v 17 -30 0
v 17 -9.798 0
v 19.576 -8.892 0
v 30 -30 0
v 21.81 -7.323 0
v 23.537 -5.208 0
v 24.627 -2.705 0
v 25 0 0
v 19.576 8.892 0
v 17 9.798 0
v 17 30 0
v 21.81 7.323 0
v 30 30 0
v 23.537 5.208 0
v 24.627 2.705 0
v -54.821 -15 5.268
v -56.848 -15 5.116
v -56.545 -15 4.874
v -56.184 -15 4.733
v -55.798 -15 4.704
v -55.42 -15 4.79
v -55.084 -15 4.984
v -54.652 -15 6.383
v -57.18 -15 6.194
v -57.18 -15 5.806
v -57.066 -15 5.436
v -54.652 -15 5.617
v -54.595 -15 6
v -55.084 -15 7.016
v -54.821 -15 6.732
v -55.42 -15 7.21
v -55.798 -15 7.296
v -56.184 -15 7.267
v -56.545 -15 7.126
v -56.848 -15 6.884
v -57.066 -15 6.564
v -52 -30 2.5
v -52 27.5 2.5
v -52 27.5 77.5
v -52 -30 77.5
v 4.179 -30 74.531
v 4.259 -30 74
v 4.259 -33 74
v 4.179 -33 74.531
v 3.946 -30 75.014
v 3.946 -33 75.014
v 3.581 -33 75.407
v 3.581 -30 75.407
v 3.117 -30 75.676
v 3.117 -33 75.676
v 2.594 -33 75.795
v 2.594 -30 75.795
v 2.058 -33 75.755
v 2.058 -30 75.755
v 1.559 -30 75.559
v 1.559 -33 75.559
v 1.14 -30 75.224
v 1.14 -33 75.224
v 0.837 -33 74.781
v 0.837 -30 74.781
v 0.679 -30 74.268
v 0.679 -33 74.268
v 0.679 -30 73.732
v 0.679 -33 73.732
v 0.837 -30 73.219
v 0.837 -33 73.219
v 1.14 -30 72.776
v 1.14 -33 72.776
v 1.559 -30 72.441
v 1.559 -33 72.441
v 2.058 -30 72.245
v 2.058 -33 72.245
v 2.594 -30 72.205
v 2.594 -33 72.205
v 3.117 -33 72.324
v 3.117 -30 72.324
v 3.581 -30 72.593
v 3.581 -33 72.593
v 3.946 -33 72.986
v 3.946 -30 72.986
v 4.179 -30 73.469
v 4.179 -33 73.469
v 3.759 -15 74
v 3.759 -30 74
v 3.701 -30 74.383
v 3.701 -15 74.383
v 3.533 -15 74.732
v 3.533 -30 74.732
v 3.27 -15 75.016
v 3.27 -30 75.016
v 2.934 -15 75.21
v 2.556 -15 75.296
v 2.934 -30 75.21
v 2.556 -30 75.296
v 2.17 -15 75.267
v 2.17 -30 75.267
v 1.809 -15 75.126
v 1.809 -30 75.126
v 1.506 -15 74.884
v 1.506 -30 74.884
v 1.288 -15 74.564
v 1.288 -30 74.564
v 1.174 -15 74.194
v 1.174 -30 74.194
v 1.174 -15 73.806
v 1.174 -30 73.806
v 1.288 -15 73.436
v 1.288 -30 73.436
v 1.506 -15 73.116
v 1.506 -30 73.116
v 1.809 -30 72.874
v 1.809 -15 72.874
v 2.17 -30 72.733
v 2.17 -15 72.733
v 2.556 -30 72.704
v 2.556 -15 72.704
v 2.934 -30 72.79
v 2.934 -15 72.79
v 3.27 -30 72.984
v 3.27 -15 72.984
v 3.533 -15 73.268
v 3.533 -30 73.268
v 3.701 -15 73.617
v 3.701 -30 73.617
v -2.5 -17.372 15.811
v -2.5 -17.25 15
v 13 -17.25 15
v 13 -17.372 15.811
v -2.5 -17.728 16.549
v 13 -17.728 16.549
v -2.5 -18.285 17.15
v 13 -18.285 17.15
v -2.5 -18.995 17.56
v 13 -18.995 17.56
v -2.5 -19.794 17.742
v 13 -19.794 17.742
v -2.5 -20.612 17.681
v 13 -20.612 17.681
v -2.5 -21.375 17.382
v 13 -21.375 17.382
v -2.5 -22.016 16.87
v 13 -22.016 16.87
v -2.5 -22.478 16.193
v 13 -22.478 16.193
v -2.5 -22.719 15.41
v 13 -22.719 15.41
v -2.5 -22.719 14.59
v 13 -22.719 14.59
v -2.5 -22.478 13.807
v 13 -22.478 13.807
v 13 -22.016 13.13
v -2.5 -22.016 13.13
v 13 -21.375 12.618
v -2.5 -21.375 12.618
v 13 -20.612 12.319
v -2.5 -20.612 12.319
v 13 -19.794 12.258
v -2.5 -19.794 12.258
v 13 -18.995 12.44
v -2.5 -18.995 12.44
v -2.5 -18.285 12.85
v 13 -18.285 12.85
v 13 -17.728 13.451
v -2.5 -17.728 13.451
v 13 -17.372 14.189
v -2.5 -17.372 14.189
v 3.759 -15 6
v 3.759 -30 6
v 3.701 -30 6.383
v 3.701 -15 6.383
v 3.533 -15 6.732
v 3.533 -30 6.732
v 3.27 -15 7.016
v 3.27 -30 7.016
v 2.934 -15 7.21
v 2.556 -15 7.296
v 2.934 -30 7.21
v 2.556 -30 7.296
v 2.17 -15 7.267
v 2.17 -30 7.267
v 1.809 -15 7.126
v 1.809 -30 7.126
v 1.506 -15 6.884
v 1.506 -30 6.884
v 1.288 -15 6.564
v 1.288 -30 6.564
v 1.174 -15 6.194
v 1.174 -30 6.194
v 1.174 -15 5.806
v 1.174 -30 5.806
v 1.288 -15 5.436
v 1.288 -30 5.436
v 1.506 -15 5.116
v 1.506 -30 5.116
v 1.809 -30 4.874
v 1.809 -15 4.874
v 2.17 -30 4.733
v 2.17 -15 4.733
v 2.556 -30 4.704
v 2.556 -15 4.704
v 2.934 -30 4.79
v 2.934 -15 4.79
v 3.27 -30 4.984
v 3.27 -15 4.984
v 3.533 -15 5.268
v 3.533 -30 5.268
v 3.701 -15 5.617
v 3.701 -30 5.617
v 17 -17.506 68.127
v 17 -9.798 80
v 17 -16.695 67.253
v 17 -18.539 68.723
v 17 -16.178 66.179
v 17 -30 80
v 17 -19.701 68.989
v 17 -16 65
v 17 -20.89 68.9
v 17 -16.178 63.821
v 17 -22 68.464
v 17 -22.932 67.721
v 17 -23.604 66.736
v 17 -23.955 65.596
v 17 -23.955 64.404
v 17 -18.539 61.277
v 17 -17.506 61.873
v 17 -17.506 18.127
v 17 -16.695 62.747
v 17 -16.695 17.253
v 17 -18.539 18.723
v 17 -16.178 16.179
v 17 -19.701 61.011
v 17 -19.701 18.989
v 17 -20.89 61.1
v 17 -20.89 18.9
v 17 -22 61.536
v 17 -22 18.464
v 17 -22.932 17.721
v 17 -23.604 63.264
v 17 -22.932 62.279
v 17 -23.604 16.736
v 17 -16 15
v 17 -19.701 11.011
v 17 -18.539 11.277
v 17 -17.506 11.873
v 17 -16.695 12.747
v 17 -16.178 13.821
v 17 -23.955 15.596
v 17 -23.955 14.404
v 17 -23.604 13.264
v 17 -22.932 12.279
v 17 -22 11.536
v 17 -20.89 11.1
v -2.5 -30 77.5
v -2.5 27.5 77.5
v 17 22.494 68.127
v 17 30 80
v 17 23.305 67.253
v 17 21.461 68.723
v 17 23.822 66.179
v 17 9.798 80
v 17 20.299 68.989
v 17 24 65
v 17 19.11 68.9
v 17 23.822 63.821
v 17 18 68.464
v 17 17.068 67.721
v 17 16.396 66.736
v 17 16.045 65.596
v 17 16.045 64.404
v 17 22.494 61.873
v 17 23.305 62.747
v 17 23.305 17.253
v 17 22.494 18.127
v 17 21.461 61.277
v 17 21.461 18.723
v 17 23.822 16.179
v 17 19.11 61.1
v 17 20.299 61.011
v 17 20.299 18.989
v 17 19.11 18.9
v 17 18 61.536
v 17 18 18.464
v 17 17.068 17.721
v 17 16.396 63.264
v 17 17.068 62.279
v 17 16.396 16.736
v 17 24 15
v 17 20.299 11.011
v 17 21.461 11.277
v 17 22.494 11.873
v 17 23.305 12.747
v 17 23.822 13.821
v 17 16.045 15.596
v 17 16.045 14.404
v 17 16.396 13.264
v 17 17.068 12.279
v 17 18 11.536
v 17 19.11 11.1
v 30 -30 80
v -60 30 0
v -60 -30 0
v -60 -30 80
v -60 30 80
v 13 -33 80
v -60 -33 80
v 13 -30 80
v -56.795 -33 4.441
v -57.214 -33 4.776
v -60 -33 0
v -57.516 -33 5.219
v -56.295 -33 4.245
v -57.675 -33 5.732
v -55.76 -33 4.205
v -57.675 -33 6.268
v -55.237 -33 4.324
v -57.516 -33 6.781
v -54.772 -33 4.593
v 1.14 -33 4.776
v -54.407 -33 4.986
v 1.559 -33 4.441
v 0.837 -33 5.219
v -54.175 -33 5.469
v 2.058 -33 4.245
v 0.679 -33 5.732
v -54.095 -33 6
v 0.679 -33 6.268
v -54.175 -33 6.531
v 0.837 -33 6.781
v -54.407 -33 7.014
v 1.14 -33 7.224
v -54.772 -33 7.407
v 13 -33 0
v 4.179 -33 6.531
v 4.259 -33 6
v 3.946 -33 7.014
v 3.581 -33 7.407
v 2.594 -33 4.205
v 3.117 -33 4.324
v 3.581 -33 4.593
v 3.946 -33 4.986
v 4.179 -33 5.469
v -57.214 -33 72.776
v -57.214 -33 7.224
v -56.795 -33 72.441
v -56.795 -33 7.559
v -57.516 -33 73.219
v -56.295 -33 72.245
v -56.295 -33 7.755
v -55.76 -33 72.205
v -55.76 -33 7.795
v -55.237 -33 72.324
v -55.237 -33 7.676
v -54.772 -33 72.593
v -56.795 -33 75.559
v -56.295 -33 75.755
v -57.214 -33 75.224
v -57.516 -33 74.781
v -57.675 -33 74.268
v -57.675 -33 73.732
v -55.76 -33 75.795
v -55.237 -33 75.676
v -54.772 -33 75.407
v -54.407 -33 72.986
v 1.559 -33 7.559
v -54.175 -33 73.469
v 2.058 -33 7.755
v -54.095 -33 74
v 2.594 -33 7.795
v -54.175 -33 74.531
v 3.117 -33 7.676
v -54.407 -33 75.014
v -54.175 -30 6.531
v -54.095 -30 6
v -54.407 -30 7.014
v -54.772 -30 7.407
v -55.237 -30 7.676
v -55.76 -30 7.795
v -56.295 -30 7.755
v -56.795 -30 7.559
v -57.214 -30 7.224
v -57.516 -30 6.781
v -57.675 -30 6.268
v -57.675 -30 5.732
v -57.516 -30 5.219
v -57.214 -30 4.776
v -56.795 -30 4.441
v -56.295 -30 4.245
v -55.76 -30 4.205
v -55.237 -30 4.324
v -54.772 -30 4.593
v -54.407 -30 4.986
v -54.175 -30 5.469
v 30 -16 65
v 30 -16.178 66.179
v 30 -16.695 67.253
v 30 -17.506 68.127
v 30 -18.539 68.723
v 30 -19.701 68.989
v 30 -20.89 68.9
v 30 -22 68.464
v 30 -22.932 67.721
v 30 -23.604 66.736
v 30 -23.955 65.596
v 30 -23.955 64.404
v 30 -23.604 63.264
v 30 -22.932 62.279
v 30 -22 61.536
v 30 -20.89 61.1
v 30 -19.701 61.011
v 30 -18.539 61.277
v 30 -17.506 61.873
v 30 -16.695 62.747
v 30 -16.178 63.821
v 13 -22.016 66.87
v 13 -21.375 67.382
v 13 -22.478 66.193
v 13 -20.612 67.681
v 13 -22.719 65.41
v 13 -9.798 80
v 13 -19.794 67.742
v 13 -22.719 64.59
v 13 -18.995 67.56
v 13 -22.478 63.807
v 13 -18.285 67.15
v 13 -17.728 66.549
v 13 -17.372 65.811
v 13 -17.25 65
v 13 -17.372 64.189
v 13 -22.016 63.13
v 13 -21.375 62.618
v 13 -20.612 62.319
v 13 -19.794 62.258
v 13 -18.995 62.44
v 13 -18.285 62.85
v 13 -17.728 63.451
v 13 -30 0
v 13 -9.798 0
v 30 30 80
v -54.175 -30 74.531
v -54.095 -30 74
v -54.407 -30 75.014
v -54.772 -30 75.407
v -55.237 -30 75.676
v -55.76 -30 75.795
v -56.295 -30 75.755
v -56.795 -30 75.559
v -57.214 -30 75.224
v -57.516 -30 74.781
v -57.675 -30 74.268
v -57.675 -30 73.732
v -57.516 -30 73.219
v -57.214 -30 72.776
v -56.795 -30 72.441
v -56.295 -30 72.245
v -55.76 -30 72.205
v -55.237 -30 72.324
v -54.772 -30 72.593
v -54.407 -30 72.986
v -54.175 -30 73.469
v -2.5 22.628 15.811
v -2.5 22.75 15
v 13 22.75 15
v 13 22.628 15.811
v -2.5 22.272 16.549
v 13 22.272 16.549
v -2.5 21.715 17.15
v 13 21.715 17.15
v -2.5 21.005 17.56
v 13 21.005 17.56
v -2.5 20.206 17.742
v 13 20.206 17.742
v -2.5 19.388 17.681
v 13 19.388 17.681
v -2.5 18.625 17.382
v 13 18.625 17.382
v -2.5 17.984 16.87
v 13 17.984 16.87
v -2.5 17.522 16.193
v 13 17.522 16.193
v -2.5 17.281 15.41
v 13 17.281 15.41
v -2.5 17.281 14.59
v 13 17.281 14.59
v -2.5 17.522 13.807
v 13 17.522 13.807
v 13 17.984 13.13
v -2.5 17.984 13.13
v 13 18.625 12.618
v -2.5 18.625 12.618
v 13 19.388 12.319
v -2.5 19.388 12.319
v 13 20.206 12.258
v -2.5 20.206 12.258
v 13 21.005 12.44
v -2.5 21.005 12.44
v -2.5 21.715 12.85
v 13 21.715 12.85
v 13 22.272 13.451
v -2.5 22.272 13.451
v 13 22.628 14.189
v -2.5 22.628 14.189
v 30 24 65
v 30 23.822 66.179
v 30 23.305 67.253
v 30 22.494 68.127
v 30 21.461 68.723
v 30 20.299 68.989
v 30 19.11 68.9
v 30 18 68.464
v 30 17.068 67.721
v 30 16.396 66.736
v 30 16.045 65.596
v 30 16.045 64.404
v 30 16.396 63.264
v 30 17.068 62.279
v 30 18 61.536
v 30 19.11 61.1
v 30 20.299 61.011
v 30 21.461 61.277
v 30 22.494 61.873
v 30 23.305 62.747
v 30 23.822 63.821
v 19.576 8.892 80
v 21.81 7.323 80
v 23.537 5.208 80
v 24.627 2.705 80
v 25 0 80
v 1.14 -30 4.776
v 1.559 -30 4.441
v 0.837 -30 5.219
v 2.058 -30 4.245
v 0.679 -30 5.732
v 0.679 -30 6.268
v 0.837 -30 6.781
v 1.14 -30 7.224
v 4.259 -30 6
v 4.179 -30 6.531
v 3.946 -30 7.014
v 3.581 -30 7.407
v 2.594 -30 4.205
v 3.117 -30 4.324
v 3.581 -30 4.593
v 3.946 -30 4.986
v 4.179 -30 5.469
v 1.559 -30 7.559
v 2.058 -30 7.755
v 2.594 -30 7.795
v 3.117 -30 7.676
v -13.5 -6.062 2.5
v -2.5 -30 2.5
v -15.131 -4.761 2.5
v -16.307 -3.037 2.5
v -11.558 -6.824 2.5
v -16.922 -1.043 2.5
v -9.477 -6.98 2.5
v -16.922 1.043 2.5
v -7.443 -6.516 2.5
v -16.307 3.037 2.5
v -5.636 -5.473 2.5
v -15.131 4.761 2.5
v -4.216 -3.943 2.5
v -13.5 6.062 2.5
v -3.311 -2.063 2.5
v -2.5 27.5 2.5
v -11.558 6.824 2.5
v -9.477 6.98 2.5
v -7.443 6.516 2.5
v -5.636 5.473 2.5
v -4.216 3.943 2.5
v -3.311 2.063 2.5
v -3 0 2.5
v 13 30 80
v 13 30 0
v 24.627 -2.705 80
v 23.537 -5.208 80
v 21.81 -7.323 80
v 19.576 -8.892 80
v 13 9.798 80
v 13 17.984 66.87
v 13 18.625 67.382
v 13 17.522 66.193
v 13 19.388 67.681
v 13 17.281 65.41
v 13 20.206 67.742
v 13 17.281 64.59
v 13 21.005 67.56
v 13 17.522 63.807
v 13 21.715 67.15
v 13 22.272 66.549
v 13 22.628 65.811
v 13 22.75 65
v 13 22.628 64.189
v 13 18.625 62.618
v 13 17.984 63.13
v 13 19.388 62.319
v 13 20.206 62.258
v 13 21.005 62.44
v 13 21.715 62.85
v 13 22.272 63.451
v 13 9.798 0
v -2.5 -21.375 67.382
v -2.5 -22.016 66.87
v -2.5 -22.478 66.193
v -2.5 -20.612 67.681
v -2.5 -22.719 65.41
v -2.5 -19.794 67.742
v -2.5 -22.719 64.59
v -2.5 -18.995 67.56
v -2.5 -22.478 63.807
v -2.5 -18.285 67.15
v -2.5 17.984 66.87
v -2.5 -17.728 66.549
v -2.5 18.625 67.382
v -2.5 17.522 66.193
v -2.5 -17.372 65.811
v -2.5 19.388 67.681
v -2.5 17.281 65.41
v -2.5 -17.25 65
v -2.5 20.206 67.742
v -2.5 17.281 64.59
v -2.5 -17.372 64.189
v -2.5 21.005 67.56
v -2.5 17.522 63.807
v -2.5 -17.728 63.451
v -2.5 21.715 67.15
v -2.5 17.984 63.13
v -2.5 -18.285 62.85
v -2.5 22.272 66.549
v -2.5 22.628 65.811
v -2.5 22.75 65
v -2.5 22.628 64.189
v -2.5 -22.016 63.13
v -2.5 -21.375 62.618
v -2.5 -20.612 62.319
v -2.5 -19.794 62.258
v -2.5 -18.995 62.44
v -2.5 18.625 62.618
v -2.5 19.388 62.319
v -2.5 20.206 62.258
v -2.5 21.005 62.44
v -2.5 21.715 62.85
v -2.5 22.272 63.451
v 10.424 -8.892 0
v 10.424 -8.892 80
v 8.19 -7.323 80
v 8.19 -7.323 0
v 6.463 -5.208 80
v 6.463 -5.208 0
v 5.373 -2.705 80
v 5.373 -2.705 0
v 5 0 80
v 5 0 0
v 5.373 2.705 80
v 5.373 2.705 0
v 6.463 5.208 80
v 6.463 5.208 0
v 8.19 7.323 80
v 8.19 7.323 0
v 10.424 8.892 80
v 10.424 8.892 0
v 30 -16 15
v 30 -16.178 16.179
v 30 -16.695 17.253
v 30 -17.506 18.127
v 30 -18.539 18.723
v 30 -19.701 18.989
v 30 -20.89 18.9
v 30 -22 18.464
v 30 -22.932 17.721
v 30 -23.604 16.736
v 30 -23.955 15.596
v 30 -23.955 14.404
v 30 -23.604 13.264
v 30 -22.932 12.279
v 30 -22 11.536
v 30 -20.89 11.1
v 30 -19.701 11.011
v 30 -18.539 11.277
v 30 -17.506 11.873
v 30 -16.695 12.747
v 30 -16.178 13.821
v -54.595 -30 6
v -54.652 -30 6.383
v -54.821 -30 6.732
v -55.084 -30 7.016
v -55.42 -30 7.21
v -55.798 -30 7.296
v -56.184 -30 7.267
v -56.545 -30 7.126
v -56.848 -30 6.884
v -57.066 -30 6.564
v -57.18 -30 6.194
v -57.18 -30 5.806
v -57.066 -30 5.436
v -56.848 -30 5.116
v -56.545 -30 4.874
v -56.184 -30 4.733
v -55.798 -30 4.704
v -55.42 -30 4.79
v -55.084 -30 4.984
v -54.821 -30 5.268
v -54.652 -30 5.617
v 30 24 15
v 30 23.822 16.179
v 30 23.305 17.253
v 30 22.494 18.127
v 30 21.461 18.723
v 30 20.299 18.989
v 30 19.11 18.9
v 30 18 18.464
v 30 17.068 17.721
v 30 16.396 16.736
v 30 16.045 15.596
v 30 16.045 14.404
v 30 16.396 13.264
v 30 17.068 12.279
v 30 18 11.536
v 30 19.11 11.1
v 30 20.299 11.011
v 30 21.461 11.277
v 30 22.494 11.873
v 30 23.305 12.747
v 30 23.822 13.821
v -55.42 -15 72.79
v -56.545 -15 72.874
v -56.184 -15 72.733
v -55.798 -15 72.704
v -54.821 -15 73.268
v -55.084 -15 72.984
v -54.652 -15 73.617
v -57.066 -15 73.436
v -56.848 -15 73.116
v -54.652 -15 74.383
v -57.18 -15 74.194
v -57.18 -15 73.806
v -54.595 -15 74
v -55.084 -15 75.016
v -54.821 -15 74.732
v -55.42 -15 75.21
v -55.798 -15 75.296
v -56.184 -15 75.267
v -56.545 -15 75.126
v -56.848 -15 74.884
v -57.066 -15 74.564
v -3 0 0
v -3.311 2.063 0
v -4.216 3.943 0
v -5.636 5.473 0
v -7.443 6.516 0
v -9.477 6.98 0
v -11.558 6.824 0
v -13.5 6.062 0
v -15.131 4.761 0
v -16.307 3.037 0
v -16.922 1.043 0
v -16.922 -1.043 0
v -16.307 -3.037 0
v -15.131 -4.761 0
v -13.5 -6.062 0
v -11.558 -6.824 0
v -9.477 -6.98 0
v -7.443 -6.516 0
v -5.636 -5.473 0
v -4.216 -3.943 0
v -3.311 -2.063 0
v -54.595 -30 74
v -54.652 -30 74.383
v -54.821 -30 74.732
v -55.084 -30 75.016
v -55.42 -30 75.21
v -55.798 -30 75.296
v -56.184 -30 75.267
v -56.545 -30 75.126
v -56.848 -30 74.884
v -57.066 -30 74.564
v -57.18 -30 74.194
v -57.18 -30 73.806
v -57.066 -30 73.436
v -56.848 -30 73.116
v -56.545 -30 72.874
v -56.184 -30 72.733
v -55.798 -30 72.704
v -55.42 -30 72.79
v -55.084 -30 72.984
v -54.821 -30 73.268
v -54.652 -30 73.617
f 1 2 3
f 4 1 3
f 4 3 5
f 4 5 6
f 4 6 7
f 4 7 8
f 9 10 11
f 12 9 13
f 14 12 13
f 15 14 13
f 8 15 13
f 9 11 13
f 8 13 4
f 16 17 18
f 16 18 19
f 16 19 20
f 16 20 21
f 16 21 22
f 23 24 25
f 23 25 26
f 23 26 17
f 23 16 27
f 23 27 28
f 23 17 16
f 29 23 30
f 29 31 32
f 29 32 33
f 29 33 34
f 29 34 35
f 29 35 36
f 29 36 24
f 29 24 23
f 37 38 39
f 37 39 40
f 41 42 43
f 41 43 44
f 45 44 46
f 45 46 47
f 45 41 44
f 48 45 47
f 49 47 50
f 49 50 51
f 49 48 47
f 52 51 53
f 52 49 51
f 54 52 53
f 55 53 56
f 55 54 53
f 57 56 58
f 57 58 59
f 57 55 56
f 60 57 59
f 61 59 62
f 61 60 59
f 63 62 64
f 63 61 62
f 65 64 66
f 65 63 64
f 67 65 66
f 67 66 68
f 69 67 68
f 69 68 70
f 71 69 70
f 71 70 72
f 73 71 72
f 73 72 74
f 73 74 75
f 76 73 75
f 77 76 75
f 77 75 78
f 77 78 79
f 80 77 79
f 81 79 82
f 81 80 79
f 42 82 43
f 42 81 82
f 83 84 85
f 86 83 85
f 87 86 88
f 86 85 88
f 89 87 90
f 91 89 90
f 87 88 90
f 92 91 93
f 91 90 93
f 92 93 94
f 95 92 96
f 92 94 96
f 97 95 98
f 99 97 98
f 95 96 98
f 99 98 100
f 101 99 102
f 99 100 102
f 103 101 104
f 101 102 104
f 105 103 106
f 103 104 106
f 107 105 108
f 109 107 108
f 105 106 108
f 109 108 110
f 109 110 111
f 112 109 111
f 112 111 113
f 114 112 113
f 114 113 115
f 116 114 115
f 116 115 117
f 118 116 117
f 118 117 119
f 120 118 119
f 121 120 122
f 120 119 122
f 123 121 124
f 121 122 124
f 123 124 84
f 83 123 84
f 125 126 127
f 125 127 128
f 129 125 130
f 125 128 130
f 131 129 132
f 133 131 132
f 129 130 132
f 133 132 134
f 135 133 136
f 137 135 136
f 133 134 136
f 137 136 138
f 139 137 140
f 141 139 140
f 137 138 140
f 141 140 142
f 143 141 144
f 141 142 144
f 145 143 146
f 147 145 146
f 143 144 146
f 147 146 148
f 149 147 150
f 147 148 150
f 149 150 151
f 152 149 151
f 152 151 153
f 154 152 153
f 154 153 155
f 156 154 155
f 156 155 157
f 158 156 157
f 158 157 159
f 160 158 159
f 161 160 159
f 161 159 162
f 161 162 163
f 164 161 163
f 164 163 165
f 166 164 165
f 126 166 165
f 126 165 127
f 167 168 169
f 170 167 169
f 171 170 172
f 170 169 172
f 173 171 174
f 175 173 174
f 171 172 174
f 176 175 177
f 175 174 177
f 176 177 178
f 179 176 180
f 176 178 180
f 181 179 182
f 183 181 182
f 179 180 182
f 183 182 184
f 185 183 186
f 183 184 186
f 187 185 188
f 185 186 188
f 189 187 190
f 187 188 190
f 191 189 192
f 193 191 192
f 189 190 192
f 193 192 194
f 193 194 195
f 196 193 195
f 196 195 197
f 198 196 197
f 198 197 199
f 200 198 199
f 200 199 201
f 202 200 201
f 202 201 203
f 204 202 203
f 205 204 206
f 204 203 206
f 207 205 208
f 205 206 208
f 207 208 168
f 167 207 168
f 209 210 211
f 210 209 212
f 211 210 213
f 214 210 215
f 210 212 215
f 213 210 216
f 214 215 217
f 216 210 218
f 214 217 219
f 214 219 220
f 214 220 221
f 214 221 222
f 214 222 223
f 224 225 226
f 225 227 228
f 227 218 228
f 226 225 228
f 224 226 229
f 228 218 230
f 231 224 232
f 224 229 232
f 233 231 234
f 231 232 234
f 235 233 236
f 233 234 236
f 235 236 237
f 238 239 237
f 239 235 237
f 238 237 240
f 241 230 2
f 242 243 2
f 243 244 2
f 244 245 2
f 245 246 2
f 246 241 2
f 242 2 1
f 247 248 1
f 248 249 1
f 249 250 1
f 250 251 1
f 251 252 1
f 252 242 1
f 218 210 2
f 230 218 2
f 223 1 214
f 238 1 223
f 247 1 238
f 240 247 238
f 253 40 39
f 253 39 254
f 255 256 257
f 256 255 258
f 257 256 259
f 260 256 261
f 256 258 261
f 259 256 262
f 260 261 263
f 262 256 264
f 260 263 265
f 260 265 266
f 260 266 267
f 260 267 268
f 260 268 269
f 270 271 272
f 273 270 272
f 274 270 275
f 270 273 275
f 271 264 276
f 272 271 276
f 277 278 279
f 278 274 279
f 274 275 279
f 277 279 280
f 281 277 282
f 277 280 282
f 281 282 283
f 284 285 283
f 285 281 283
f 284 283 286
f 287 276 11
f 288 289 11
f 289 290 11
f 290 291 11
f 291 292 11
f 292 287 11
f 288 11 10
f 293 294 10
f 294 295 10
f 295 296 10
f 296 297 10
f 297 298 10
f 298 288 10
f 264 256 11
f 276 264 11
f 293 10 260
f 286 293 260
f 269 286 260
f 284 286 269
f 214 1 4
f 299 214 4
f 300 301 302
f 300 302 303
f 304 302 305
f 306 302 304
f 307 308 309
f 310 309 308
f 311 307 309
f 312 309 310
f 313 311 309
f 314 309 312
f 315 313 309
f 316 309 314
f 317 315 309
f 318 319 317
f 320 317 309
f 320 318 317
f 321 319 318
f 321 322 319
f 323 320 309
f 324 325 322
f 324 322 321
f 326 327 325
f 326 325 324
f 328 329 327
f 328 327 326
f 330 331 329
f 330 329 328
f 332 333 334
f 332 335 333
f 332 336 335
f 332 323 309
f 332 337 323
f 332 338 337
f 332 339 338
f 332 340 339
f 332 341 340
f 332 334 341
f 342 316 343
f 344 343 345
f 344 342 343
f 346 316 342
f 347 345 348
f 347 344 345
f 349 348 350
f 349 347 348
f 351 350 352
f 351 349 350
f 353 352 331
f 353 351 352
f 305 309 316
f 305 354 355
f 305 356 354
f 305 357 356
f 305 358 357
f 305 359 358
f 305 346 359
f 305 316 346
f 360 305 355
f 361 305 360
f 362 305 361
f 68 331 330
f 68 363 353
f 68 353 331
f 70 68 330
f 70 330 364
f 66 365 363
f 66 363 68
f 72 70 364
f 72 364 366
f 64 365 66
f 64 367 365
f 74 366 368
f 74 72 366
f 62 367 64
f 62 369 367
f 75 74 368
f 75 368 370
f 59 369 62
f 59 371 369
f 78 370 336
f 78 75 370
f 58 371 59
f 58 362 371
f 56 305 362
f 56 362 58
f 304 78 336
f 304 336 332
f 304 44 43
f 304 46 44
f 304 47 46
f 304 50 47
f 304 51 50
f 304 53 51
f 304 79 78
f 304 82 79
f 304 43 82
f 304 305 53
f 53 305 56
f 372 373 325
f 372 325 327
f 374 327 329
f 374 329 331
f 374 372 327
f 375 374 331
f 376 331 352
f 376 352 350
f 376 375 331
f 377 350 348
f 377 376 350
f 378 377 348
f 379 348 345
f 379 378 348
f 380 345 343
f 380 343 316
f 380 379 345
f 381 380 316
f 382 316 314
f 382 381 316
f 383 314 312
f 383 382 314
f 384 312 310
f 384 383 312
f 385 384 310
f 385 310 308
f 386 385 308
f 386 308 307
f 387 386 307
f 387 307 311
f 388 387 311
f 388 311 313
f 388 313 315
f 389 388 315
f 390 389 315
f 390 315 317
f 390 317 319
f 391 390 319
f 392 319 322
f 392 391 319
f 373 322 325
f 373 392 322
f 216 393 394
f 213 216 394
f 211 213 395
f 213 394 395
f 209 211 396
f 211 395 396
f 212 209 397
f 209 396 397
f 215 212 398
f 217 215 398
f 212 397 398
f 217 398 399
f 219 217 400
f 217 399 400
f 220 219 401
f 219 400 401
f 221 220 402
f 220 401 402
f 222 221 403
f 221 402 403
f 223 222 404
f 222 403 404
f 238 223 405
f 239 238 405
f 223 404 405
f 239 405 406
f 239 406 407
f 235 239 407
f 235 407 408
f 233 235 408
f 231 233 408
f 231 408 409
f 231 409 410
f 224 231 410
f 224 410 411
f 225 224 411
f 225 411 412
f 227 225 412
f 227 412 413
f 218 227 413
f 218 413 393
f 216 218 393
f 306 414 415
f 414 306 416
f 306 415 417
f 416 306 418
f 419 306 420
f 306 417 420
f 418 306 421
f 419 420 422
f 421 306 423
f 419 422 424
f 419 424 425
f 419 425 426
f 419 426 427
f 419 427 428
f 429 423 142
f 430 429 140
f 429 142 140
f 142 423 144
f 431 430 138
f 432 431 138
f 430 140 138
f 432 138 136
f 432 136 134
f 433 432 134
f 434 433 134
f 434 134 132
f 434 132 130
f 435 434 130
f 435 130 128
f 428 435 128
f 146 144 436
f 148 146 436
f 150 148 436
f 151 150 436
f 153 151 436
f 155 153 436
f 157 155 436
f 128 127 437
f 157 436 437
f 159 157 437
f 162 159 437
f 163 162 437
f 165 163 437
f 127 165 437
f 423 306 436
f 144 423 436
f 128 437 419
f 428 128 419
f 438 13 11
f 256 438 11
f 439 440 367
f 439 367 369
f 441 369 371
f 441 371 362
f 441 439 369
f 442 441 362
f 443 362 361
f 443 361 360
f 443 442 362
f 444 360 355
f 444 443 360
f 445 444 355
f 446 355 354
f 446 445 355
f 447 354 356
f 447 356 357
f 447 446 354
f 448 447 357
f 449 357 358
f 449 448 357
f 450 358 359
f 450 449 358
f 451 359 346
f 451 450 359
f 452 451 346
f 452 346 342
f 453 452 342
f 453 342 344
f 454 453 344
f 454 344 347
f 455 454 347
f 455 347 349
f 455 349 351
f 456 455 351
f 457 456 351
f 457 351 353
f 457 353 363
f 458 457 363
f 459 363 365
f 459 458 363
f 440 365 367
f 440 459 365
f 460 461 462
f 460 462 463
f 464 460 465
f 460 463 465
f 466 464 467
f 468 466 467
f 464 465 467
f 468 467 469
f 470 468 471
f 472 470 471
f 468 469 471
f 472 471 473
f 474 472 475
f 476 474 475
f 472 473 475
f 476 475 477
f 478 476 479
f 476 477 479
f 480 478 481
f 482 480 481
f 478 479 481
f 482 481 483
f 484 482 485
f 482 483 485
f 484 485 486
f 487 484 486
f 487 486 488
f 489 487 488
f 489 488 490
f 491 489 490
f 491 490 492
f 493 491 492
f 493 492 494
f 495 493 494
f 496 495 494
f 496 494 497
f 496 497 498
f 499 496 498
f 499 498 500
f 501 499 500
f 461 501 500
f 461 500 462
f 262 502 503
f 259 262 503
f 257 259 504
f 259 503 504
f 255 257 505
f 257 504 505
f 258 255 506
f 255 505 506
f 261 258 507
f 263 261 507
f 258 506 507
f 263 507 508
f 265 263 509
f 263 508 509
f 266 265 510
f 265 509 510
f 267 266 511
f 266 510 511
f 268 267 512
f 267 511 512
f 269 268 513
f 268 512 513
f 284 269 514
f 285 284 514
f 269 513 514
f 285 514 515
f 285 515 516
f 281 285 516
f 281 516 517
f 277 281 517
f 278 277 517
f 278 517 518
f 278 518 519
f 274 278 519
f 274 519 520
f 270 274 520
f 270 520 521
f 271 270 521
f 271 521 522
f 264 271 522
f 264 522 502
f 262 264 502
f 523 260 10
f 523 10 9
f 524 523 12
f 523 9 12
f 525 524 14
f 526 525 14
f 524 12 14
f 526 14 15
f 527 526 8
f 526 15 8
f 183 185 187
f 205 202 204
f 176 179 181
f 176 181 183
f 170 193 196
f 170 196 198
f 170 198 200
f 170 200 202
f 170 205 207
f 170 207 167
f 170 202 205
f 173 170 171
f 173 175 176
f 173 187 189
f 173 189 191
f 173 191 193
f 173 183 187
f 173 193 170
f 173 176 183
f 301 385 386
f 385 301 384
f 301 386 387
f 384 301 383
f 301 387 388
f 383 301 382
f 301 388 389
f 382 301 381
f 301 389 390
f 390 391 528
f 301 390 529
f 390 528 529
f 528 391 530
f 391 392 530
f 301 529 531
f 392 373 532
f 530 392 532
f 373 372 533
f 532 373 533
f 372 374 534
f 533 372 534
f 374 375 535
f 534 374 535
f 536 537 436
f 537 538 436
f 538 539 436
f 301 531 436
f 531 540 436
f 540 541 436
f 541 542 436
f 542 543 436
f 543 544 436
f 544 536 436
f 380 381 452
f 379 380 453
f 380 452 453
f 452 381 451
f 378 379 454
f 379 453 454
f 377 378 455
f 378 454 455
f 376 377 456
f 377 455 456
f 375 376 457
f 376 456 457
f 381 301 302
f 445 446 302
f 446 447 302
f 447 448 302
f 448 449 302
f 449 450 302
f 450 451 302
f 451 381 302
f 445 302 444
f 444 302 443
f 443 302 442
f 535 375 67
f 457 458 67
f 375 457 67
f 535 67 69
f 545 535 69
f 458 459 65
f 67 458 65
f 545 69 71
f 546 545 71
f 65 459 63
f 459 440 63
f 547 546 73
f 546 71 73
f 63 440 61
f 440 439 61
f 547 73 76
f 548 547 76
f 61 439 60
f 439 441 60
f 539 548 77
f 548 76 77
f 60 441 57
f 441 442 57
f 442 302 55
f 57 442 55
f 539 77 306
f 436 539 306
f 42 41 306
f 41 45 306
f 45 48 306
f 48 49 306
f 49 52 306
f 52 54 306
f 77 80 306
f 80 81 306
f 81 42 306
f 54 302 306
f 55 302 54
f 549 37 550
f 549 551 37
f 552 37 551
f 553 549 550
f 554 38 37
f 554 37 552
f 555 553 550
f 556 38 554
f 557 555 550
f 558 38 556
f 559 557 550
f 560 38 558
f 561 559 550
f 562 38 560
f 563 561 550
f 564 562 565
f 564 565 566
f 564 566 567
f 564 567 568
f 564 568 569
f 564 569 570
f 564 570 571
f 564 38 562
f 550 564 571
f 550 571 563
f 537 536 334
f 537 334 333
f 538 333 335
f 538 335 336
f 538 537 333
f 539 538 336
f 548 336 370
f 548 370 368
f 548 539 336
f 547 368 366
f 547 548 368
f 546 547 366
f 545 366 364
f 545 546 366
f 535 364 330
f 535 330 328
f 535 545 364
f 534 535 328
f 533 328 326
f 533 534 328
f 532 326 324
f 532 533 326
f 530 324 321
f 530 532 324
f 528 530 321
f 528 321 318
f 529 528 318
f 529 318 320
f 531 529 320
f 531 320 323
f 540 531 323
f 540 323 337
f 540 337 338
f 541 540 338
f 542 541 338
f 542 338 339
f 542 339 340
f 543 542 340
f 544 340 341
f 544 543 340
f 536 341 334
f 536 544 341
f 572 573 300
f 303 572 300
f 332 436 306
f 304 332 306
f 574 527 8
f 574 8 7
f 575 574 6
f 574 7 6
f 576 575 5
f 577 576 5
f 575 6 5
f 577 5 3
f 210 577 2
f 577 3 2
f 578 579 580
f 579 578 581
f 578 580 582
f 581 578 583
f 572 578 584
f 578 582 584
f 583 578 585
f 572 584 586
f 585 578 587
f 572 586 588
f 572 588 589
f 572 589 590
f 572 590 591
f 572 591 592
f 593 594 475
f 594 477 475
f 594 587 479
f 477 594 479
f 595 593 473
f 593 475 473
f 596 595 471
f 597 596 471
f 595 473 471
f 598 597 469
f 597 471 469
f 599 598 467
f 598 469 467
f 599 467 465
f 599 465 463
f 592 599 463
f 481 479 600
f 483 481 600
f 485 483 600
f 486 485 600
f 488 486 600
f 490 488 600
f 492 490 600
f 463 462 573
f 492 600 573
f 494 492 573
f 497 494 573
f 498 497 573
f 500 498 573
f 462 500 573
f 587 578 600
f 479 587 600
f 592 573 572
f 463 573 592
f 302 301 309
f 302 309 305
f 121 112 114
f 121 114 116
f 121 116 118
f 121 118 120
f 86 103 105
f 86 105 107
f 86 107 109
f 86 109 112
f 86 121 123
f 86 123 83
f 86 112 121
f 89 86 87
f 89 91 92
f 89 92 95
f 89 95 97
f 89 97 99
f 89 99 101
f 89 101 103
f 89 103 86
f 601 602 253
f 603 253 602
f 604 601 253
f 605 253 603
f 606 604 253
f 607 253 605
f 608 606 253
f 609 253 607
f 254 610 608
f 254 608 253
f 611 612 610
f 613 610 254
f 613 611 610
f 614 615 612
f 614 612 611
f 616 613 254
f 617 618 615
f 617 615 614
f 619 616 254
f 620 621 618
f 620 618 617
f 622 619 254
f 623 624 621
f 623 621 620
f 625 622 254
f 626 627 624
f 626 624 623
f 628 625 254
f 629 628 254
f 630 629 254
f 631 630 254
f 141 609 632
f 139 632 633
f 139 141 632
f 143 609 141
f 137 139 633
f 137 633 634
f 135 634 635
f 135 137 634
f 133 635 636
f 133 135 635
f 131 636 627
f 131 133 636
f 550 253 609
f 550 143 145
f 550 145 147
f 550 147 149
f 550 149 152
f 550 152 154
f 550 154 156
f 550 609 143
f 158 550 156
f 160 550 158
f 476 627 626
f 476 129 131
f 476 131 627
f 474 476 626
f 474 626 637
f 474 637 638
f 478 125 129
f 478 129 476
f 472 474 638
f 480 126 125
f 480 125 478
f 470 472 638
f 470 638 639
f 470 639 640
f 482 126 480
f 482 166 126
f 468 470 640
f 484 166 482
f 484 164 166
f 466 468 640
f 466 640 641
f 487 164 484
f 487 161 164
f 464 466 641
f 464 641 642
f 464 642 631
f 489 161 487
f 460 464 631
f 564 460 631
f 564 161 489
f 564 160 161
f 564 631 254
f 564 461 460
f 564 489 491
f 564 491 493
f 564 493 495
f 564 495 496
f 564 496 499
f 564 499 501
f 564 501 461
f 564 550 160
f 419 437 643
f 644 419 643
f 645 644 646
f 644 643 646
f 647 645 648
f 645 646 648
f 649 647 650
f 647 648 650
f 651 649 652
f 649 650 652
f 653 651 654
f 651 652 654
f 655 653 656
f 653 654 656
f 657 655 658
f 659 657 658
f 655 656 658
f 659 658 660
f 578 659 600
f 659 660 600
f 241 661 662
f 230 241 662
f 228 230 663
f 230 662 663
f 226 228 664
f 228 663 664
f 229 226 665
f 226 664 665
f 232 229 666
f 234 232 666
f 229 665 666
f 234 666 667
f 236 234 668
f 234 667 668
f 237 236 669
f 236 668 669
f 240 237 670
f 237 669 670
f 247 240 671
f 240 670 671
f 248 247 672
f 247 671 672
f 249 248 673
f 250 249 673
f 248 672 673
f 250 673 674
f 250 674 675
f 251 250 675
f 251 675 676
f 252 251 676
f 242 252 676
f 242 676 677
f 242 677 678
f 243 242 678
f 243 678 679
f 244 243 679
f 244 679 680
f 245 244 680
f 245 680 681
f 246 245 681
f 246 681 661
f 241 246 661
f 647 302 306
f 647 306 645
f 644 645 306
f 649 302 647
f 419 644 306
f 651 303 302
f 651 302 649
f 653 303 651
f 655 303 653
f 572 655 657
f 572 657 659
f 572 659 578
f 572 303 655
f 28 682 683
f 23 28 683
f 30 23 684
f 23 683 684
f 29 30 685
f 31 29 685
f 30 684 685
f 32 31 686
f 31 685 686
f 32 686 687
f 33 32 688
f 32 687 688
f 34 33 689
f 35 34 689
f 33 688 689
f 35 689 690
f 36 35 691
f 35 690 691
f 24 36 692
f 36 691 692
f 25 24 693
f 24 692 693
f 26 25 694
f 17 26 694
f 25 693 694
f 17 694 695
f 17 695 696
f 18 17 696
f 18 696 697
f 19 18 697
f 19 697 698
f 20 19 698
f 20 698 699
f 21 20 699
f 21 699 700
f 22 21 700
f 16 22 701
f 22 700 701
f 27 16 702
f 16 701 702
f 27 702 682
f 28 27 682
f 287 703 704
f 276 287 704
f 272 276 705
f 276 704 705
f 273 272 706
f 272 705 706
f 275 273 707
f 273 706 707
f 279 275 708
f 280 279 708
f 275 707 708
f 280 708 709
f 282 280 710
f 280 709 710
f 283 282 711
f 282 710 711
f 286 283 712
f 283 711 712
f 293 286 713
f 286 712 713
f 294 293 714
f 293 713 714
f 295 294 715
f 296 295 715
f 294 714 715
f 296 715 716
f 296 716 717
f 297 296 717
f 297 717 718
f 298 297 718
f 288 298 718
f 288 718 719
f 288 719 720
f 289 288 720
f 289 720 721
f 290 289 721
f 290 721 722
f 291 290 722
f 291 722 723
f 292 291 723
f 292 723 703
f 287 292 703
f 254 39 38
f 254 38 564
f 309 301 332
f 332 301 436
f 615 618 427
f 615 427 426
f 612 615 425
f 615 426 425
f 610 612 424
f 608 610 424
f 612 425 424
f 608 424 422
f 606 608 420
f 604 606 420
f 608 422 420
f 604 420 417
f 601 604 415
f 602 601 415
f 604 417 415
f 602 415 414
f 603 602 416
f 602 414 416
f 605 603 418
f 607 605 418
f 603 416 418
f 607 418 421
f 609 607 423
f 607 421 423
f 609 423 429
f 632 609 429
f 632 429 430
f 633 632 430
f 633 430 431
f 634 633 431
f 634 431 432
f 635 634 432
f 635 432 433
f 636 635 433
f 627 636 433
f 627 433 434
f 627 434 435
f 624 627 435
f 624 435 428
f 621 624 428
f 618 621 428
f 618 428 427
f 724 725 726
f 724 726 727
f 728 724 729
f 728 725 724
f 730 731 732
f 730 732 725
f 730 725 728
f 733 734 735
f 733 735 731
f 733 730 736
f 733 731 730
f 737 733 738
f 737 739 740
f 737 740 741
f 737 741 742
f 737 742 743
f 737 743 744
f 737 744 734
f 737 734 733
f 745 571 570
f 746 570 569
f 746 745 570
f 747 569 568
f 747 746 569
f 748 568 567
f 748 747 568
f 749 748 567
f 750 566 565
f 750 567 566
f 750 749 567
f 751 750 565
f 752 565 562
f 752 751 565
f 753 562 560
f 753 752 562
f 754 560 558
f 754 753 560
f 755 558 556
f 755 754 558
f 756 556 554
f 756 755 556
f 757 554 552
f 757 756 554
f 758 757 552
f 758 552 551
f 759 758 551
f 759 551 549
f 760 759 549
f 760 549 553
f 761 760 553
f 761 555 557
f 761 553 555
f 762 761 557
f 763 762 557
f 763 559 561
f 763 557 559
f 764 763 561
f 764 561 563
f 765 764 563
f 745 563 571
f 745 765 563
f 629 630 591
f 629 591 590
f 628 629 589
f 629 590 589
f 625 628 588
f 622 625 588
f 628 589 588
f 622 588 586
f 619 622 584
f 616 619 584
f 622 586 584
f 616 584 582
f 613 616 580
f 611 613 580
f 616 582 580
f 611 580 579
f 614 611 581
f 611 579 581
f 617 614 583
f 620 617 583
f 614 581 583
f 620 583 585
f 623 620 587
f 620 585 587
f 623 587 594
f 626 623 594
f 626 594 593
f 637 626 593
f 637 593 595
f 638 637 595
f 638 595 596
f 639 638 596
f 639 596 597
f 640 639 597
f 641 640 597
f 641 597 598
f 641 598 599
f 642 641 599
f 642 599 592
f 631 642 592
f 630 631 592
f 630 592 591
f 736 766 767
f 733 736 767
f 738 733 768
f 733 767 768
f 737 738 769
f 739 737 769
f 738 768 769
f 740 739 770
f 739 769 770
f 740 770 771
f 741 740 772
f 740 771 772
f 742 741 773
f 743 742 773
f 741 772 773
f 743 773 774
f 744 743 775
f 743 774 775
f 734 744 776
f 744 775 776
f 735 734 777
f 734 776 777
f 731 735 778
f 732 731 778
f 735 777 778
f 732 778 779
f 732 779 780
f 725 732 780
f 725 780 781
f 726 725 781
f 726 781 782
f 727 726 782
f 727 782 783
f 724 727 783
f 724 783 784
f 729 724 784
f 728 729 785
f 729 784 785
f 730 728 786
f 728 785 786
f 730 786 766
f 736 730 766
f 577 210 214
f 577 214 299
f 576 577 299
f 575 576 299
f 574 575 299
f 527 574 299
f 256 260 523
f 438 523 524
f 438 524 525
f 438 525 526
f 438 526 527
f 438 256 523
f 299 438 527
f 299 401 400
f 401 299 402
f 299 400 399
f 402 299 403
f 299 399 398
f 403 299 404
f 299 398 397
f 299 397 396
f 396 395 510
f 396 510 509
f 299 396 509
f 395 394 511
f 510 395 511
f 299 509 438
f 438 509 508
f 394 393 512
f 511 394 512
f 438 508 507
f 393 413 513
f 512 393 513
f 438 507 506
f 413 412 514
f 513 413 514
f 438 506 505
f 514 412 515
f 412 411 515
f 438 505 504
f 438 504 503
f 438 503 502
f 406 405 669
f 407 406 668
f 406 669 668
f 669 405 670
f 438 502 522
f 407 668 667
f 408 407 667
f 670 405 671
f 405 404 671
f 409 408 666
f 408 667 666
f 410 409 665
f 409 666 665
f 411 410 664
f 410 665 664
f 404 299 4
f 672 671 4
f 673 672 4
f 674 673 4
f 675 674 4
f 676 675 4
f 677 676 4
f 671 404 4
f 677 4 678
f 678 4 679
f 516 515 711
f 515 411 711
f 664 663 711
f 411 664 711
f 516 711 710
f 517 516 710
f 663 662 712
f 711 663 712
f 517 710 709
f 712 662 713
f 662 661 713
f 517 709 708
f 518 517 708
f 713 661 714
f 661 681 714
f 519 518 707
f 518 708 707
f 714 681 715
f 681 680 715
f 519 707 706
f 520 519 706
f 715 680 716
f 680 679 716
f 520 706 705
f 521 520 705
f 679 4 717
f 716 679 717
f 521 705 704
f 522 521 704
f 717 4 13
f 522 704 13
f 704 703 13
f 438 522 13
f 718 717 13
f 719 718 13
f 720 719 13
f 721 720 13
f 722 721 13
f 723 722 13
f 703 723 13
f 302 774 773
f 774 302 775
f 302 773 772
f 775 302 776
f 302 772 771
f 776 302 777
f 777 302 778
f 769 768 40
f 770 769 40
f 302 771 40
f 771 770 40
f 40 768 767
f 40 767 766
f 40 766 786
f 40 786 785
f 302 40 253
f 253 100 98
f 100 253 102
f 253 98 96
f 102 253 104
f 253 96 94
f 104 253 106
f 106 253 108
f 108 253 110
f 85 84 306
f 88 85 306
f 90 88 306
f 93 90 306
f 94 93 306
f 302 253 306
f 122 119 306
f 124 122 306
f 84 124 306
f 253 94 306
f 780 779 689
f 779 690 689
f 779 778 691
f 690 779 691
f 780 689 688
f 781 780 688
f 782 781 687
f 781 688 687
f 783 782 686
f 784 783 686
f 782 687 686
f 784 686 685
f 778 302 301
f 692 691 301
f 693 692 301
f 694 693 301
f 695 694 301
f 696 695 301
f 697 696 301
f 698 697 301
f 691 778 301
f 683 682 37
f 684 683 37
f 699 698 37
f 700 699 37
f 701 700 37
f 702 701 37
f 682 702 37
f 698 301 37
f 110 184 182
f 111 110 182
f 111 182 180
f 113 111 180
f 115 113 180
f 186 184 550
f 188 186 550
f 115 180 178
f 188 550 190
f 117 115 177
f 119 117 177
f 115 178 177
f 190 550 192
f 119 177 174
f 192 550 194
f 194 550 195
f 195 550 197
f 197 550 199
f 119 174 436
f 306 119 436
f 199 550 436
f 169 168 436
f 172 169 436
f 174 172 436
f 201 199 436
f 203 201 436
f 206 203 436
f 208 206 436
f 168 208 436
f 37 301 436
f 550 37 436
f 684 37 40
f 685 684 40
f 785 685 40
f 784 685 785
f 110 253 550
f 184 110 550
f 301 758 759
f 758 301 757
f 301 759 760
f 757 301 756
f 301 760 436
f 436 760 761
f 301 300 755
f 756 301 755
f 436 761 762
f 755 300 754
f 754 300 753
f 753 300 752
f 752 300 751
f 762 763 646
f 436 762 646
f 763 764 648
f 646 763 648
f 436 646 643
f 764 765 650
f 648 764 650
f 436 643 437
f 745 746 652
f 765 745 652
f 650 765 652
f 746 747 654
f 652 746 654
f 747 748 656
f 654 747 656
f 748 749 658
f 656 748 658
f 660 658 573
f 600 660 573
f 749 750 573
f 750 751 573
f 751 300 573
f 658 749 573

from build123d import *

# Parameters (mm, degrees)
F1_DEPTH  = 80
F0_W      = 60
F0_H      = 60
F2_DEPTH  = 80
F3_T      = -2.5
F4_W      = 60
F4_H      = 80
F5_DEPTH  = 8
F7_R      = 2.75
F8_DEPTH  = 35
F7_R_2    = 4
F9_DEPTH  = 15
F10_R     = 7
F11_DEPTH = 25
F12_W     = 73
F12_H     = 80
F12_R     = 1.8
F12_W_2   = 49.5
F12_H_2   = 75
F13_DEPTH = 3
F12_R_2   = 1.3
F14_DEPTH = 15


with BuildPart() as f1:
    # F0 (on Top) → F1 (new body)
    with BuildSketch(Plane.XY):
        with BuildLine():
            ThreePointArc((17, 9.7979589711), (22.7459666924, 6.3245553203), (25, 0))
            ThreePointArc((25, 0), (22.7459666924, -6.3245553203), (17, -9.7979589711))
            Line((17, -9.7979589711), (17, -30))
            Line((17, -30), (30, -30))
            Line((30, -30), (30, 30))
            Line((30, 30), (17, 30))
            Line((17, 30), (17, 9.7979589711))
        make_face()
    extrude(amount=F1_DEPTH)


with BuildPart() as f1b:
    # F0 (on Top) → F1, piece 2 (new body)
    with BuildSketch(Plane.XY):
        with BuildLine():
            ThreePointArc((13, -9.7979589711), (5, 0), (13, 9.7979589711))
            Line((13, 9.7979589711), (13, 30))
            Line((13, 30), (0, 30))
            Line((0, 30), (0, -30))
            Line((0, -30), (13, -30))
            Line((13, -30), (13, -9.7979589711))
        make_face()
    extrude(amount=F1_DEPTH)


with BuildPart() as f2:
    # F0 (on Top) → F2 (new body)
    with BuildSketch(Plane.XY):
        with Locations((-30, 0)):
            Rectangle(F0_W, F0_H)
    extrude(amount=F2_DEPTH)

    # F3
    f3_openings = [f2.faces().sort_by_distance(p)[0] for p in [
        (-30, -30, 40),
    ]]
    offset(amount=F3_T, openings=f3_openings)

    # F4 (on face) → F5 (join)
    with BuildSketch(Plane(origin=(-60, 0, 0), x_dir=(0, -1, 0), z_dir=(-1, 0, 0))):
        with Locations((0, 40)):
            Rectangle(F4_W, F4_H)
    extrude(amount=-F5_DEPTH)

    # F6: union F1b
    add(f1b.part)


with BuildPart() as f8_tool:
    # F7 (on face) → F8 (new body)
    with BuildSketch(Plane.YZ.offset(30)):
        with Locations((-20, 65)):
            Circle(F7_R)
        with Locations((20, 65)):
            Circle(F7_R)
        with Locations((20, 15)):
            Circle(F7_R)
        with Locations((-20, 15)):
            Circle(F7_R)
    extrude(amount=-F8_DEPTH)


with BuildPart() as f1_1:
    add(f1.part)

    # F8: cut by f8_tool
    add(f8_tool.part, mode=Mode.SUBTRACT)

    # F7 (on face) → F9 (cut)
    with BuildSketch(Plane.YZ.offset(30)):
        with Locations((-20, 65)):
            Circle(F7_R_2)
        with Locations((-20, 65)):
            Circle(F7_R, mode=Mode.SUBTRACT)
        with Locations((20, 65)):
            Circle(F7_R_2)
        with Locations((20, 65)):
            Circle(F7_R, mode=Mode.SUBTRACT)
        with Locations((20, 15)):
            Circle(F7_R_2)
        with Locations((20, 15)):
            Circle(F7_R, mode=Mode.SUBTRACT)
        with Locations((-20, 15)):
            Circle(F7_R_2)
        with Locations((-20, 15)):
            Circle(F7_R, mode=Mode.SUBTRACT)
    extrude(amount=-F9_DEPTH, mode=Mode.SUBTRACT)


with BuildPart() as f2_1:
    add(f2.part)

    # F8: cut by f8_tool
    add(f8_tool.part, mode=Mode.SUBTRACT)

    # F10 (on face) → F11 (cut)
    with BuildSketch(Plane.XY):
        with Locations((-10, 0)):
            Circle(F10_R)
    extrude(amount=F11_DEPTH, mode=Mode.SUBTRACT)

    # F12 (on face) → F14 (cut)
    with BuildSketch(Plane.XZ.offset(30)):
        with Locations((-55.894702673, 74)):
            Circle(F12_R_2)
        with Locations((2.4590059184, 74)):
            Circle(F12_R_2)
        with Locations((-55.894702673, 6)):
            Circle(F12_R_2)
        with Locations((2.4590059184, 6)):
            Circle(F12_R_2)
    extrude(amount=-F14_DEPTH, mode=Mode.SUBTRACT)


with BuildPart() as f13:
    # F12 (on face) → F13 (new body)
    with BuildSketch(Plane.XZ.offset(30)):
        with Locations((-23.5, 40)):
            Rectangle(F12_W, F12_H)
        with Locations((-55.894702673, 6)):
            Circle(F12_R, mode=Mode.SUBTRACT)
        with Locations((2.4590059184, 6)):
            Circle(F12_R, mode=Mode.SUBTRACT)
        with Locations((-27.25, 40)):
            Rectangle(F12_W_2, F12_H_2, mode=Mode.SUBTRACT)
        with Locations((-55.894702673, 74)):
            Circle(F12_R, mode=Mode.SUBTRACT)
        with Locations((2.4590059184, 74)):
            Circle(F12_R, mode=Mode.SUBTRACT)
        with Locations((-27.25, 40)):
            Rectangle(F12_W_2, F12_H_2)
    extrude(amount=F13_DEPTH)


solid = Compound([f1_1.part, f2_1.part, f13.part])
